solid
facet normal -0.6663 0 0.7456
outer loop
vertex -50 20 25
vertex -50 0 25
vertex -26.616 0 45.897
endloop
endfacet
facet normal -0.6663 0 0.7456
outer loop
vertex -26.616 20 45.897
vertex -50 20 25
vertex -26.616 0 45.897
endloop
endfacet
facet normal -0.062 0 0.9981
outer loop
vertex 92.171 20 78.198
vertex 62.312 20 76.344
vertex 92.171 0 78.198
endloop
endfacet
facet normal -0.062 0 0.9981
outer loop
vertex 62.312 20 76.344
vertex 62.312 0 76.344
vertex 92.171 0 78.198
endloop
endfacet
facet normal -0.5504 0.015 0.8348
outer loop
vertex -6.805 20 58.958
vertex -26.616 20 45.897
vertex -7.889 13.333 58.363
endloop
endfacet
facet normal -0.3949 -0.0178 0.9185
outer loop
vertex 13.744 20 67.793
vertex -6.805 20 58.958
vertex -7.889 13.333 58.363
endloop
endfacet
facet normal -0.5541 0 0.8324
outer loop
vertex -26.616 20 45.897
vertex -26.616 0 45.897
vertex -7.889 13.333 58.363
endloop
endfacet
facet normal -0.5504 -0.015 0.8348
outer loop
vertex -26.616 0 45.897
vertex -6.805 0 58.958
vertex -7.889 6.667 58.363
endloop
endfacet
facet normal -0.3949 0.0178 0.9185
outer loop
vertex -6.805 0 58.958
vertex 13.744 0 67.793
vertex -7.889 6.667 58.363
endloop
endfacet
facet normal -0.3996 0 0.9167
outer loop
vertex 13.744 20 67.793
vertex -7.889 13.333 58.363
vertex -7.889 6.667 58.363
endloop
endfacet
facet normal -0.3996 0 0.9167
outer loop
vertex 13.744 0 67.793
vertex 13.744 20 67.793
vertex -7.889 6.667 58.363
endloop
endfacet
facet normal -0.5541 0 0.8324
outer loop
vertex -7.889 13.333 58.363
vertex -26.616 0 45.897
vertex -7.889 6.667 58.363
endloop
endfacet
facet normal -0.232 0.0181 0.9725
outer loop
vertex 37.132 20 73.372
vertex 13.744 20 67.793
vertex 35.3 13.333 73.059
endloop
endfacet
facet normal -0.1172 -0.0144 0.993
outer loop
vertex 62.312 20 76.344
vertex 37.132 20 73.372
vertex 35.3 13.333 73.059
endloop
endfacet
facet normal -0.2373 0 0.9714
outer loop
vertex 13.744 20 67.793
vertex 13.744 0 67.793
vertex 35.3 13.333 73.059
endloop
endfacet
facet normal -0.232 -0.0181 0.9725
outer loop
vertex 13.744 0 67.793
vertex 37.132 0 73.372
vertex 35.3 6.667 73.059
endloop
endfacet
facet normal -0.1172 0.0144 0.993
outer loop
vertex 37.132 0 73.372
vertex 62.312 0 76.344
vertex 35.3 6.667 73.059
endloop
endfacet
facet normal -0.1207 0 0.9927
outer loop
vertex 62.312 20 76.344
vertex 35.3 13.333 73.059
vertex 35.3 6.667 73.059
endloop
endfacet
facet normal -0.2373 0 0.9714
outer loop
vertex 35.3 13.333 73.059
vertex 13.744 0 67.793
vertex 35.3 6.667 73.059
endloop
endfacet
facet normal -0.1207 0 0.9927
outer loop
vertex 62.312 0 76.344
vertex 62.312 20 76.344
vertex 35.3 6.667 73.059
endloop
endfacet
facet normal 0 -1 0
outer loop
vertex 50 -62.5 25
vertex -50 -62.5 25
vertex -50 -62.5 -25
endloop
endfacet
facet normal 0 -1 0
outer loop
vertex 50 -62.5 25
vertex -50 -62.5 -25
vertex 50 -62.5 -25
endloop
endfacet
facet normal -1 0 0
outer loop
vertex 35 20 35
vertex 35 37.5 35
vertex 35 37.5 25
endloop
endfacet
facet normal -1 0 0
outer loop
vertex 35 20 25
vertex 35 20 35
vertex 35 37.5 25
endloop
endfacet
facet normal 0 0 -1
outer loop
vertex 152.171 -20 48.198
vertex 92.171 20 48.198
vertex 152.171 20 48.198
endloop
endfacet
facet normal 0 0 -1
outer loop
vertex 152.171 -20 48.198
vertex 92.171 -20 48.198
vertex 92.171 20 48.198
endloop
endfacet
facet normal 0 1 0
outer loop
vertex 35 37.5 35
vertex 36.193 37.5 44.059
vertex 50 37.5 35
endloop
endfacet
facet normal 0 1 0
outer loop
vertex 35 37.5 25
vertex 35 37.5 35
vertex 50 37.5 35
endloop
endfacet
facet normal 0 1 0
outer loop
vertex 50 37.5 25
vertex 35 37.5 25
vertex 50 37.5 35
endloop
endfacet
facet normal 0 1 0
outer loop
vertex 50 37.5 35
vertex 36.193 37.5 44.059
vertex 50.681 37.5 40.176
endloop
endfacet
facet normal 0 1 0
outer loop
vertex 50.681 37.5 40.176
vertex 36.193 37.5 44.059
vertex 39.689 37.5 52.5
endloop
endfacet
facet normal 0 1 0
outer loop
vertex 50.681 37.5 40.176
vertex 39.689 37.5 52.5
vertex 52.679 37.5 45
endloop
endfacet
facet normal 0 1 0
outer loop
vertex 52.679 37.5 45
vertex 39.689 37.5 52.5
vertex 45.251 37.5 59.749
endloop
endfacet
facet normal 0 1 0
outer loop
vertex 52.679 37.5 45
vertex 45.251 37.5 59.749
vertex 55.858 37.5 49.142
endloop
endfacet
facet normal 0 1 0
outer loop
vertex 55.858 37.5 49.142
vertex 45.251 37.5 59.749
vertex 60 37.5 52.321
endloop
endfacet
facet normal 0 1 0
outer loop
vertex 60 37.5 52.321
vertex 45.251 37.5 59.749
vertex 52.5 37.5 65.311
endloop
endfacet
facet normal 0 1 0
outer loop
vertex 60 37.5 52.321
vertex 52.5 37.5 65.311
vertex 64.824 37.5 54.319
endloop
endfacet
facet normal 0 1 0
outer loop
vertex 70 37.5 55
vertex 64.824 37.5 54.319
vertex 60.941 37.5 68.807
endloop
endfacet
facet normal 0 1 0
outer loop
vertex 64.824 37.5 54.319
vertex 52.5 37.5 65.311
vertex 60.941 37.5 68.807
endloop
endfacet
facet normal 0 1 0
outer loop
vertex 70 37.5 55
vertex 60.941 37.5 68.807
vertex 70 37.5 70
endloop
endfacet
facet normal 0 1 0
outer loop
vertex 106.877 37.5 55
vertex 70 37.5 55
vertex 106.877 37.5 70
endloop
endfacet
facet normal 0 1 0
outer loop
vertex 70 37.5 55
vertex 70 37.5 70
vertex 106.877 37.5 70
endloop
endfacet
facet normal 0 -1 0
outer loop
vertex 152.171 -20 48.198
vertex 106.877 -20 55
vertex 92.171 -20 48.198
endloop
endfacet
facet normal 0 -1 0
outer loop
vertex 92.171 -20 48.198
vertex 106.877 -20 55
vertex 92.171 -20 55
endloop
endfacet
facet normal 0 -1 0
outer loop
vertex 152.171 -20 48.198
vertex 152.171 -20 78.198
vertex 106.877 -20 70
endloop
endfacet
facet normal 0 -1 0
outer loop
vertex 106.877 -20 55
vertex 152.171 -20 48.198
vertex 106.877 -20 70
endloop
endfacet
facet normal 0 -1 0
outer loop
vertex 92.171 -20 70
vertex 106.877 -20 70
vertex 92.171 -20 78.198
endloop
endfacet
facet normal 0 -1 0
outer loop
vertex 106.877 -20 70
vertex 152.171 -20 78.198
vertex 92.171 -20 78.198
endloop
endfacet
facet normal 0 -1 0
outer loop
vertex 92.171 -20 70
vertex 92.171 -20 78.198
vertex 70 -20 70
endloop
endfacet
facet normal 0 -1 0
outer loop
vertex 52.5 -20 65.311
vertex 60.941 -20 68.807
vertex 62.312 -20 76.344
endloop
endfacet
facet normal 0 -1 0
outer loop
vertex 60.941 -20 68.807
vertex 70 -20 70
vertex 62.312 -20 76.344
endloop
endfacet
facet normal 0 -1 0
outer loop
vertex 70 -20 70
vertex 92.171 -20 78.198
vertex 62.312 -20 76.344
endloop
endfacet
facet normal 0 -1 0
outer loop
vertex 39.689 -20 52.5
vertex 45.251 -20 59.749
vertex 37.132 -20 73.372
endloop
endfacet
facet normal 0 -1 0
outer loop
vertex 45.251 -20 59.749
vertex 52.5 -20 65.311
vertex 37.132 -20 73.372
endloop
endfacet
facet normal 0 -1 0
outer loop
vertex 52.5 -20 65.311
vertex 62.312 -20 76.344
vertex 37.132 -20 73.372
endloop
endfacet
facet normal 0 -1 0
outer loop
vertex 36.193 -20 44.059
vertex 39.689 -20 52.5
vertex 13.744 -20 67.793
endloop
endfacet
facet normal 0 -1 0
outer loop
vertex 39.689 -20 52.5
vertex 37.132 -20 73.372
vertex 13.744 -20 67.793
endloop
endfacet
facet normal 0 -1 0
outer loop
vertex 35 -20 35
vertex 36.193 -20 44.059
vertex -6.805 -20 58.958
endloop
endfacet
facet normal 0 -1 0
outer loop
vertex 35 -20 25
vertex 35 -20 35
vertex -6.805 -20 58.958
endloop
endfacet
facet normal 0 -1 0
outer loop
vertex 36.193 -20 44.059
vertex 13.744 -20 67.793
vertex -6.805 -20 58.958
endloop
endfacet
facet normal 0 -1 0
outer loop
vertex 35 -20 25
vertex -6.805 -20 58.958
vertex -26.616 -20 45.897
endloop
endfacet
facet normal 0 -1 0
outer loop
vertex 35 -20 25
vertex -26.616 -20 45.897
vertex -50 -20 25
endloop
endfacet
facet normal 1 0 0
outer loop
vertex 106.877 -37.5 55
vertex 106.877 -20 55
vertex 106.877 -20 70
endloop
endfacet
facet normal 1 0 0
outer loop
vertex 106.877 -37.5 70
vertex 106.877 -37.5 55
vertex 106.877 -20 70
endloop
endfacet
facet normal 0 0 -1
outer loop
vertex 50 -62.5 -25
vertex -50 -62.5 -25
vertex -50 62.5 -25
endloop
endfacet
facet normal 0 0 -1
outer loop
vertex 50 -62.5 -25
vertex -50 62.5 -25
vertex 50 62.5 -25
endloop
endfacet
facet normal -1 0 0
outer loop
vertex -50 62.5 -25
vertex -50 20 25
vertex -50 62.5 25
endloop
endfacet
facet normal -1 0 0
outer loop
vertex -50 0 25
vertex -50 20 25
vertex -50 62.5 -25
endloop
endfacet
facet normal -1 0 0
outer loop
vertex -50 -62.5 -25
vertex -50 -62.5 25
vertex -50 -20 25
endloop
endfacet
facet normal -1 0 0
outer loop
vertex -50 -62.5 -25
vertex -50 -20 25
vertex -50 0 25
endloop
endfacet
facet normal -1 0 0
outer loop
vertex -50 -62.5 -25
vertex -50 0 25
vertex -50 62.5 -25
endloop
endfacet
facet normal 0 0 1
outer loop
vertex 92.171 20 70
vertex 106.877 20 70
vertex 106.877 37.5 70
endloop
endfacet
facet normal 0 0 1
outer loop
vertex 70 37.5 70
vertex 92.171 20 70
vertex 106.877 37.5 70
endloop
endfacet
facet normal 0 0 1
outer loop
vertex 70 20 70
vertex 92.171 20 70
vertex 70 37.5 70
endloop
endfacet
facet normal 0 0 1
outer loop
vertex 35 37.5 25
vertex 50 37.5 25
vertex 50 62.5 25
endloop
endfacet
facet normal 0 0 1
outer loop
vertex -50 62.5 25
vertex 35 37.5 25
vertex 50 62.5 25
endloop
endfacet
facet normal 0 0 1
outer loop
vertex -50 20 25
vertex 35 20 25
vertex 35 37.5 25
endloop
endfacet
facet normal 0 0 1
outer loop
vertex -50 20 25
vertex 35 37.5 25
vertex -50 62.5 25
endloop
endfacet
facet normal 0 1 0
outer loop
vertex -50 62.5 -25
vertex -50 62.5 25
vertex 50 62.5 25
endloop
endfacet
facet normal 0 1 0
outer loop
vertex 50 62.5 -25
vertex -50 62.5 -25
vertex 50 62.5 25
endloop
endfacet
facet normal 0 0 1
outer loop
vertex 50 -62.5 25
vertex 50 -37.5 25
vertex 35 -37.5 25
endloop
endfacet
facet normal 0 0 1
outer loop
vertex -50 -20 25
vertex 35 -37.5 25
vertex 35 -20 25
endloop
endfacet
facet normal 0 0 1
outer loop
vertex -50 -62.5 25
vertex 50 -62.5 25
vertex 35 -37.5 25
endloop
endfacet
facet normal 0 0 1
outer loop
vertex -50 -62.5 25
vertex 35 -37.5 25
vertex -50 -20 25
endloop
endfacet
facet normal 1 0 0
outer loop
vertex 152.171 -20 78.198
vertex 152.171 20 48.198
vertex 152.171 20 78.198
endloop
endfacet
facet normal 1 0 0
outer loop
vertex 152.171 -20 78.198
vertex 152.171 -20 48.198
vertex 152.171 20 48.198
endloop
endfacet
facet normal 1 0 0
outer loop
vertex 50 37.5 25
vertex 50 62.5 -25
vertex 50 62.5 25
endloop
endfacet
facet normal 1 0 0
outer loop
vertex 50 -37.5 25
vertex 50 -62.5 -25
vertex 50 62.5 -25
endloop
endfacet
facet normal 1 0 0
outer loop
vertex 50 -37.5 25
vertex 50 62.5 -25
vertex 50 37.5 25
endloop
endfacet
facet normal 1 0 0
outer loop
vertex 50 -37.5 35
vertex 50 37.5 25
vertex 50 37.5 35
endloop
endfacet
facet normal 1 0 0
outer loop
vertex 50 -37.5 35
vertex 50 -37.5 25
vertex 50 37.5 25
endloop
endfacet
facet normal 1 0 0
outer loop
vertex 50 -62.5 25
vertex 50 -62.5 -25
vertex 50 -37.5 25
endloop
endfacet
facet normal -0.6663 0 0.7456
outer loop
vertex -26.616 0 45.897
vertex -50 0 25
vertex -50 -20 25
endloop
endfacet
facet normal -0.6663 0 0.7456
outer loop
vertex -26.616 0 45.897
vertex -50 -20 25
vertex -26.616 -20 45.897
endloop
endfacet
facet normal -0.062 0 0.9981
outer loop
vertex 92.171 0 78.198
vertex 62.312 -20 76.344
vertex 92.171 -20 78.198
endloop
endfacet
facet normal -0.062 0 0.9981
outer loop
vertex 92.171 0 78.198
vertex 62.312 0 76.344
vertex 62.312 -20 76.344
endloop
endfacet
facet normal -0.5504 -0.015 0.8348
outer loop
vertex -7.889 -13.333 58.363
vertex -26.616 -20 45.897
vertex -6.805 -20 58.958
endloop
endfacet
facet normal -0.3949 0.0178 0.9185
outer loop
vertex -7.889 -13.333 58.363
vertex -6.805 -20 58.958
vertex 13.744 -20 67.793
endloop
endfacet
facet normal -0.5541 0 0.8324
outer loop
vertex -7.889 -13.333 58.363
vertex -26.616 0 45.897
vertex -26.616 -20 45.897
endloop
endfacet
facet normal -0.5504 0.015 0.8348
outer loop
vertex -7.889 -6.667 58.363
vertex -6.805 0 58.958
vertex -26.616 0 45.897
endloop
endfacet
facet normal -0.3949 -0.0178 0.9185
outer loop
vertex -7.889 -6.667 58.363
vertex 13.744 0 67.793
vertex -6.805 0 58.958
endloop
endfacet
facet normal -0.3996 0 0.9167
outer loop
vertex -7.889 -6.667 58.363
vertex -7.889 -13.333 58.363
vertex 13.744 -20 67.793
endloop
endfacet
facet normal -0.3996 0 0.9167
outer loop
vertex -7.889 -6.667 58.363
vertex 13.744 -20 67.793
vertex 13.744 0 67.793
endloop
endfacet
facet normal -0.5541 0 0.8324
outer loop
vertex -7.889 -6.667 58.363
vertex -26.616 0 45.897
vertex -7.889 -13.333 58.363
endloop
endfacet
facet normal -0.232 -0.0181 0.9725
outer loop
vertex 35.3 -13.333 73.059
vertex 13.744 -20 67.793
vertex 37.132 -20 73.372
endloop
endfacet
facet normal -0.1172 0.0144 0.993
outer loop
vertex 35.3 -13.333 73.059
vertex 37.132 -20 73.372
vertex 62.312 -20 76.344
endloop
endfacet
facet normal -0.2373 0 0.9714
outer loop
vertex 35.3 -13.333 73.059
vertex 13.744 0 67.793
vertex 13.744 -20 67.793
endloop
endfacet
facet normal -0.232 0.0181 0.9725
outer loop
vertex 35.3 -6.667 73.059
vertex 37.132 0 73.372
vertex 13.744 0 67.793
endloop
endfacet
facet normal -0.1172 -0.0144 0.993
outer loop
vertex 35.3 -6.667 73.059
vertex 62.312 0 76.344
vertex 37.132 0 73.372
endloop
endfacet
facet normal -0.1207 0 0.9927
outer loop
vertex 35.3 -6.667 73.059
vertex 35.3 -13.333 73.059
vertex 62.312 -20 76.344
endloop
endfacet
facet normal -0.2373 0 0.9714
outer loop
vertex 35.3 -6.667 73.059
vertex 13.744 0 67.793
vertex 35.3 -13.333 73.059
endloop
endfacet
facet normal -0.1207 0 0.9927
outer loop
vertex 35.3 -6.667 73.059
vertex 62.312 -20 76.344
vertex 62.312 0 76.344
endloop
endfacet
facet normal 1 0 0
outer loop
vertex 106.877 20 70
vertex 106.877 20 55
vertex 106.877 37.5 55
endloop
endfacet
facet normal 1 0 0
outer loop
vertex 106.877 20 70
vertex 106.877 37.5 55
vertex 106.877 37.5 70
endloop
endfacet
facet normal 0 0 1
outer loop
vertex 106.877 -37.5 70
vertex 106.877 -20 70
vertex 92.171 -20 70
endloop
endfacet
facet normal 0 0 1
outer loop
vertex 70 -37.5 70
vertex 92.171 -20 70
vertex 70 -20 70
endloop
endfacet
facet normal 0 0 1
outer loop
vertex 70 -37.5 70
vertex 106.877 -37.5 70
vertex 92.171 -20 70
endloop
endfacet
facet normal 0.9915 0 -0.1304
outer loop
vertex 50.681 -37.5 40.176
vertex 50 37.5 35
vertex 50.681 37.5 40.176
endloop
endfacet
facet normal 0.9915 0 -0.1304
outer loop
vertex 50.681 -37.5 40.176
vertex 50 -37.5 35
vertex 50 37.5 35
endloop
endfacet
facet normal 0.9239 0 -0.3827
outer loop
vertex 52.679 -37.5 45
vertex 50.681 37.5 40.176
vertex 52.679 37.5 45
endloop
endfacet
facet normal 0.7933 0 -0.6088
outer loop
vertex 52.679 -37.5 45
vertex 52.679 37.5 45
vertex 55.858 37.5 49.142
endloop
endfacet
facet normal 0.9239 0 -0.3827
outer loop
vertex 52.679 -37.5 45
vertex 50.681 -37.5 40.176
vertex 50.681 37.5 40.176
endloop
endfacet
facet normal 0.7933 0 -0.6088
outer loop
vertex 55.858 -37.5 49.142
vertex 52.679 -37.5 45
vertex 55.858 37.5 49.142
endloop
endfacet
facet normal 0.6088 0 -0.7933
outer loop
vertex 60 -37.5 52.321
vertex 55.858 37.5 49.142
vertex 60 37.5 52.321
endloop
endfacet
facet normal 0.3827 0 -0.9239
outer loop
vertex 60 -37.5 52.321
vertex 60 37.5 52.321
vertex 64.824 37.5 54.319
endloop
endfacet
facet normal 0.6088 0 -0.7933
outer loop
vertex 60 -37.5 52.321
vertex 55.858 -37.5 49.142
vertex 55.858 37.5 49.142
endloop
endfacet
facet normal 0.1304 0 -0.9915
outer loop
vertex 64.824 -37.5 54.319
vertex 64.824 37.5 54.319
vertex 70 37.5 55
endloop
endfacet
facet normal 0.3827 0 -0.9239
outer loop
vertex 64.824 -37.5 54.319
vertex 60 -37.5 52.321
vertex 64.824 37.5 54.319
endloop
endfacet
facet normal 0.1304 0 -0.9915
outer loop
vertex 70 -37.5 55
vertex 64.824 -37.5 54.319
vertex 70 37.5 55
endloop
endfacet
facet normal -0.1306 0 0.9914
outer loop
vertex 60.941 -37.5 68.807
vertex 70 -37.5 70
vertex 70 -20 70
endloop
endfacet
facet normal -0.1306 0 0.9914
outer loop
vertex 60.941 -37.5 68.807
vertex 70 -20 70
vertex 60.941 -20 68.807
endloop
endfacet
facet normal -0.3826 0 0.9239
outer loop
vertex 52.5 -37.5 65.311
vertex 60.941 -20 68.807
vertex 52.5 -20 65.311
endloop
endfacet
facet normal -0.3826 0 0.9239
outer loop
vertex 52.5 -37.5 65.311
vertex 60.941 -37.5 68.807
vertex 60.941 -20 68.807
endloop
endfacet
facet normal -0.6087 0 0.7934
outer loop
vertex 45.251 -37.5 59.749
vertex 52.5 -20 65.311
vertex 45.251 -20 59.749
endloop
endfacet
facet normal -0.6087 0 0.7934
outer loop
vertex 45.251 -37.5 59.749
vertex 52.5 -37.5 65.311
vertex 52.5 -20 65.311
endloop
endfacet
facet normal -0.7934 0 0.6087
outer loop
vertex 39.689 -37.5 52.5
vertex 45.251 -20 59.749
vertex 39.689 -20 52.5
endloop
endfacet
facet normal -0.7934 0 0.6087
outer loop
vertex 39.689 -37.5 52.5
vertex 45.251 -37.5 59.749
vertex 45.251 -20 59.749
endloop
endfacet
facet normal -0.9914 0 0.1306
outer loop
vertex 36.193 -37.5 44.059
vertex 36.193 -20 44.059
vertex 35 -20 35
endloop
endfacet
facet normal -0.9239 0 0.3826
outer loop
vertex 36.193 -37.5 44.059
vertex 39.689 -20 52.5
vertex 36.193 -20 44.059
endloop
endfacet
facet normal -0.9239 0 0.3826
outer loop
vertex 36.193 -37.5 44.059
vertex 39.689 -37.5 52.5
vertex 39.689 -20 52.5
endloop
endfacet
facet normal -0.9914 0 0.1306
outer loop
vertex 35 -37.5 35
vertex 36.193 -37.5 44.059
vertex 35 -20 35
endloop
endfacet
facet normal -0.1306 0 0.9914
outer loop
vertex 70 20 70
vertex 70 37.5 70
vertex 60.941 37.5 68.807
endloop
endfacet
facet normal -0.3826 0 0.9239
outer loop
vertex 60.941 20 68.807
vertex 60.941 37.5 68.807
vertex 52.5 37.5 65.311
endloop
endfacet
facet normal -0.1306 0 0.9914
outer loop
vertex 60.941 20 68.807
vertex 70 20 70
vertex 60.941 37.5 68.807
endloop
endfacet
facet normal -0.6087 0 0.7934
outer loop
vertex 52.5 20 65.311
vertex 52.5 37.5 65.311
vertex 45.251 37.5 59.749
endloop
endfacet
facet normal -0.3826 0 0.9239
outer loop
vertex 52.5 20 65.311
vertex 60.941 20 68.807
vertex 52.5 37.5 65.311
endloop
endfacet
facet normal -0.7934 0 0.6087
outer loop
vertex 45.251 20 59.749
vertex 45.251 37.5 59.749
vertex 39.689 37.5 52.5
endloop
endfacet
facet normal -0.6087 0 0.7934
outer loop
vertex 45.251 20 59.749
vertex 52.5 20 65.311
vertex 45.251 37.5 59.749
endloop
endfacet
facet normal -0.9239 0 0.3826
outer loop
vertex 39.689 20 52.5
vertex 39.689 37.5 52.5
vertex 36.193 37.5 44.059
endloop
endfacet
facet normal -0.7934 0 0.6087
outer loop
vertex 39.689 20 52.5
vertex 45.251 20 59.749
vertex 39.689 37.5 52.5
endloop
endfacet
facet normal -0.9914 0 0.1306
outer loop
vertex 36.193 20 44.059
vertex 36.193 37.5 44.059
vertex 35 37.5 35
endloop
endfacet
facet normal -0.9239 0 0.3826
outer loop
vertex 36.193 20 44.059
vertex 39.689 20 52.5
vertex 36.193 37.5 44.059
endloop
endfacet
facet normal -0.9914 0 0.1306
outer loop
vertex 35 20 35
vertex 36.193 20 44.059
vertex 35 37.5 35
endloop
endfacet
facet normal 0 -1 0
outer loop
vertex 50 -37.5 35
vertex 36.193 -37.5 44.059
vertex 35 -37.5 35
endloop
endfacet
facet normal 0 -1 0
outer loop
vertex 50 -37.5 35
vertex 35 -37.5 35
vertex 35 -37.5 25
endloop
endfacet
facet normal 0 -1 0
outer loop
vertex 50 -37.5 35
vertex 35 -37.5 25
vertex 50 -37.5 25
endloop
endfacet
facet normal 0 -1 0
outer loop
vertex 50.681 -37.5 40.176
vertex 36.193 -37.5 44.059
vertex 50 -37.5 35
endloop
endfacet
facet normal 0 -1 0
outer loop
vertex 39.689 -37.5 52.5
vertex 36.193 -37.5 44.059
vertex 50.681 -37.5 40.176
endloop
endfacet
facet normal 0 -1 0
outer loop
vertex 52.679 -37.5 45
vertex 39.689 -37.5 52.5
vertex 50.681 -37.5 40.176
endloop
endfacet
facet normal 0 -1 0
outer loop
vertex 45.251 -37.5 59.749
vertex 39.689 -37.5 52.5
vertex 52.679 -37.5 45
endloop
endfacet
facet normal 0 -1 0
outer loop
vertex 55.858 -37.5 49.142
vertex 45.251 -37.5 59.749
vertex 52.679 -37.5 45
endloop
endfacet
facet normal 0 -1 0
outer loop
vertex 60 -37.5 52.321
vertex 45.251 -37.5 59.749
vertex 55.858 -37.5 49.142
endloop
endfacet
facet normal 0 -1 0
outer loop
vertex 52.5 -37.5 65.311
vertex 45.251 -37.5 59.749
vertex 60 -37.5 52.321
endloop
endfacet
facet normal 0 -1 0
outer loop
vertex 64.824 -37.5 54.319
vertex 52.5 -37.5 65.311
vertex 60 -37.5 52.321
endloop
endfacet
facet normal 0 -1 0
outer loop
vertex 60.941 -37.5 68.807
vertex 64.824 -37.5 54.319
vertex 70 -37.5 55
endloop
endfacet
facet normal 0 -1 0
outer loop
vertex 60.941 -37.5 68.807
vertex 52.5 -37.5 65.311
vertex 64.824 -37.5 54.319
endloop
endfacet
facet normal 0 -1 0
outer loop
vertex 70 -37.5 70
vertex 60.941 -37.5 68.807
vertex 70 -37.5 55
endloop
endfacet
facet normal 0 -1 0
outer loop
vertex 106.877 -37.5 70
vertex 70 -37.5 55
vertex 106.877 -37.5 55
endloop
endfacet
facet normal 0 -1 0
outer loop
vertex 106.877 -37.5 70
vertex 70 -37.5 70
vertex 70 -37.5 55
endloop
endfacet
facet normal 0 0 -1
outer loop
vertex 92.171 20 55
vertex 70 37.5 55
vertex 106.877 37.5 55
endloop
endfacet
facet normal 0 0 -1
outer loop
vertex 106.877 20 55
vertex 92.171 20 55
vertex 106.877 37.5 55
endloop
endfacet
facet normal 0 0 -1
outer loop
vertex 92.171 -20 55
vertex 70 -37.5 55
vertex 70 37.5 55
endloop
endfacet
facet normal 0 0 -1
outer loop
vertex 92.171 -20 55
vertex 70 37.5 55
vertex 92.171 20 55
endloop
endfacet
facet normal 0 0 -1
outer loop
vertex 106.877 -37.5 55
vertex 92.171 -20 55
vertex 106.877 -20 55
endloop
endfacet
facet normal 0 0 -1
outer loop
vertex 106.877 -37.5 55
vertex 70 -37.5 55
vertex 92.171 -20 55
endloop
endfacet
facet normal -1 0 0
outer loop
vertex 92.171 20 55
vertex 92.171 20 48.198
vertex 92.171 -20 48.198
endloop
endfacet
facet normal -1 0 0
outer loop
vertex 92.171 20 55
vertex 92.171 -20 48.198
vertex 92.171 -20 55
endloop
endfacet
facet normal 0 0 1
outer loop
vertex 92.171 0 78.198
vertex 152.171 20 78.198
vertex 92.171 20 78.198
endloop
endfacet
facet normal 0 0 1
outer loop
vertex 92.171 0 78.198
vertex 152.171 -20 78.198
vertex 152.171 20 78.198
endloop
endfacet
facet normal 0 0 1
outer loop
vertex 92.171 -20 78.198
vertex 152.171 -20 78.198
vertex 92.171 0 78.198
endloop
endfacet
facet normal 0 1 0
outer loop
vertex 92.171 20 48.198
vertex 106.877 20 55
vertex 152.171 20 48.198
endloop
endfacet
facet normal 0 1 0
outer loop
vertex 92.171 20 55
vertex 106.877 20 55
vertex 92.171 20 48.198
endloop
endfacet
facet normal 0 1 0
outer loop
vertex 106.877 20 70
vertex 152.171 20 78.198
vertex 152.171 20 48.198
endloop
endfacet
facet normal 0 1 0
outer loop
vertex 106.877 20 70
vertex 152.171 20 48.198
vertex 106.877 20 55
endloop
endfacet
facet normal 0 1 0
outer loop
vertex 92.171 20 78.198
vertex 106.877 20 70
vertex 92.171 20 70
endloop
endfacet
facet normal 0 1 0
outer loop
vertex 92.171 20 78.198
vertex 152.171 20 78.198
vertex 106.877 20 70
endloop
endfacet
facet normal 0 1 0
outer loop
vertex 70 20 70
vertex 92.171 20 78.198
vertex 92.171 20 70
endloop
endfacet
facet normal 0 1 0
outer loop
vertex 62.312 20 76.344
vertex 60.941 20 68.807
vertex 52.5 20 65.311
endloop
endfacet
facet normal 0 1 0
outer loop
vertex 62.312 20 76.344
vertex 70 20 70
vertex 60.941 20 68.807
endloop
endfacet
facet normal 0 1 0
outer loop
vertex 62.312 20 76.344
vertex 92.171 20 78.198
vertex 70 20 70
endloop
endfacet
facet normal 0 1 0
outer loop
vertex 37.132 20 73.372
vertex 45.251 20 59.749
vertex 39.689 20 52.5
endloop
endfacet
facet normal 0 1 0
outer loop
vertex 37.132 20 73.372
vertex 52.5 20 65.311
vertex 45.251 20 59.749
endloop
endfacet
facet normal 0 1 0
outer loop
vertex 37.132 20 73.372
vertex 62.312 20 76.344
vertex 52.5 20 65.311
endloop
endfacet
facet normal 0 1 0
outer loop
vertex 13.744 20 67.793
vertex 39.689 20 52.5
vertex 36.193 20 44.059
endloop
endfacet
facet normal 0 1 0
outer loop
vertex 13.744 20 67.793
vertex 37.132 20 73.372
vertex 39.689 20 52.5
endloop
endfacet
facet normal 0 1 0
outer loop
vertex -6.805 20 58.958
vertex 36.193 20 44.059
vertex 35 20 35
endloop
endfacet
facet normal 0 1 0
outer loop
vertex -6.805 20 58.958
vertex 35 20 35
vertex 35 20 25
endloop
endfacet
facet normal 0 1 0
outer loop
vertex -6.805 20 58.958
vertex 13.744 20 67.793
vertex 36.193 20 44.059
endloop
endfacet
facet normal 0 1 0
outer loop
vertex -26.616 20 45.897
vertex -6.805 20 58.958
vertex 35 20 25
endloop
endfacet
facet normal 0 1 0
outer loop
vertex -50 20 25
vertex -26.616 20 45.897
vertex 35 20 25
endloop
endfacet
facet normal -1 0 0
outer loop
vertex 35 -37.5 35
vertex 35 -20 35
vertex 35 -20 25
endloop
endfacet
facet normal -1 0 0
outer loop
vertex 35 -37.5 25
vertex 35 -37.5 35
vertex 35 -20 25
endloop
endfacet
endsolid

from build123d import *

# Parameters (mm, degrees)
F1_DEPTH = 62.5
F0_W     = 14.7052842798
F0_H     = 15
F2_DEPTH = 37.5
F0_H_2   = 6.8016763031
F0_H_3   = 8.1983236969
F3_DEPTH = 20


with BuildPart() as f1:
    # F0 (on Front) → F1 (new body, symmetric)
    with BuildSketch(Plane.XZ):
        Polygon((-50, 25), (-50, -25), (50, -25), (50, 25), (35, 25), align=None)
    extrude(amount=F1_DEPTH, both=True)

    # F0 (on Front) → F2 (join, symmetric)
    with BuildSketch(Plane.XZ):
        with Locations((99.52410253, 62.5)):
            Rectangle(F0_W, F0_H)
        with BuildLine():
            Line((35, 25), (50, 25))
            Line((50, 25), (50, 35))
            ThreePointArc((50, 35), (55.8578643763, 49.1421356237), (70, 55))
            Line((70, 55), (92.1714603901, 55))
            Line((92.1714603901, 55), (92.1714603901, 70))
            Line((92.1714603901, 70), (70, 70))
            ThreePointArc((70, 70), (45.2512626585, 59.7487373415), (35, 35))
            Line((35, 35), (35, 25))
        make_face()
    extrude(amount=F2_DEPTH, both=True)

    # F0 (on Front) → F3 (join, symmetric)
    with BuildSketch(Plane.XZ):
        with BuildLine():
            add(Edge.make_bspline(
                [(-50, 25), (-4.2251776904, 70.7326084375), (24.2556538433, 74.8012959957), (92.1714603901, 78.1983236969)],
                knots=[0, 0, 0, 0, 151.7985039241, 151.7985039241, 151.7985039241, 151.7985039241], degree=3))
            Line((-50, 25), (35, 25))
            Line((35, 25), (35, 35))
            ThreePointArc((35, 35), (45.2512626585, 59.7487373415), (70, 70))
            Line((70, 70), (92.1714603901, 70))
            Line((92.1714603901, 70), (92.1714603901, 78.1983236969))
        make_face()
        Polygon((106.8767446699, 48.1983236969), (137.2651457787, 48.1983236969), (152.1714603901, 48.1983236969), (152.1714603901, 78.1983236969), (127.8208345175, 78.1983236969), (106.8767446699, 78.1983236969), (106.8767446699, 70), (106.8767446699, 55), align=None)
        with Locations((99.52410253, 51.5991618484)):
            Rectangle(F0_W, F0_H_2)
        with Locations((99.52410253, 74.0991618484)):
            Rectangle(F0_W, F0_H_3)
    extrude(amount=F3_DEPTH, both=True)


solid = f1.part
